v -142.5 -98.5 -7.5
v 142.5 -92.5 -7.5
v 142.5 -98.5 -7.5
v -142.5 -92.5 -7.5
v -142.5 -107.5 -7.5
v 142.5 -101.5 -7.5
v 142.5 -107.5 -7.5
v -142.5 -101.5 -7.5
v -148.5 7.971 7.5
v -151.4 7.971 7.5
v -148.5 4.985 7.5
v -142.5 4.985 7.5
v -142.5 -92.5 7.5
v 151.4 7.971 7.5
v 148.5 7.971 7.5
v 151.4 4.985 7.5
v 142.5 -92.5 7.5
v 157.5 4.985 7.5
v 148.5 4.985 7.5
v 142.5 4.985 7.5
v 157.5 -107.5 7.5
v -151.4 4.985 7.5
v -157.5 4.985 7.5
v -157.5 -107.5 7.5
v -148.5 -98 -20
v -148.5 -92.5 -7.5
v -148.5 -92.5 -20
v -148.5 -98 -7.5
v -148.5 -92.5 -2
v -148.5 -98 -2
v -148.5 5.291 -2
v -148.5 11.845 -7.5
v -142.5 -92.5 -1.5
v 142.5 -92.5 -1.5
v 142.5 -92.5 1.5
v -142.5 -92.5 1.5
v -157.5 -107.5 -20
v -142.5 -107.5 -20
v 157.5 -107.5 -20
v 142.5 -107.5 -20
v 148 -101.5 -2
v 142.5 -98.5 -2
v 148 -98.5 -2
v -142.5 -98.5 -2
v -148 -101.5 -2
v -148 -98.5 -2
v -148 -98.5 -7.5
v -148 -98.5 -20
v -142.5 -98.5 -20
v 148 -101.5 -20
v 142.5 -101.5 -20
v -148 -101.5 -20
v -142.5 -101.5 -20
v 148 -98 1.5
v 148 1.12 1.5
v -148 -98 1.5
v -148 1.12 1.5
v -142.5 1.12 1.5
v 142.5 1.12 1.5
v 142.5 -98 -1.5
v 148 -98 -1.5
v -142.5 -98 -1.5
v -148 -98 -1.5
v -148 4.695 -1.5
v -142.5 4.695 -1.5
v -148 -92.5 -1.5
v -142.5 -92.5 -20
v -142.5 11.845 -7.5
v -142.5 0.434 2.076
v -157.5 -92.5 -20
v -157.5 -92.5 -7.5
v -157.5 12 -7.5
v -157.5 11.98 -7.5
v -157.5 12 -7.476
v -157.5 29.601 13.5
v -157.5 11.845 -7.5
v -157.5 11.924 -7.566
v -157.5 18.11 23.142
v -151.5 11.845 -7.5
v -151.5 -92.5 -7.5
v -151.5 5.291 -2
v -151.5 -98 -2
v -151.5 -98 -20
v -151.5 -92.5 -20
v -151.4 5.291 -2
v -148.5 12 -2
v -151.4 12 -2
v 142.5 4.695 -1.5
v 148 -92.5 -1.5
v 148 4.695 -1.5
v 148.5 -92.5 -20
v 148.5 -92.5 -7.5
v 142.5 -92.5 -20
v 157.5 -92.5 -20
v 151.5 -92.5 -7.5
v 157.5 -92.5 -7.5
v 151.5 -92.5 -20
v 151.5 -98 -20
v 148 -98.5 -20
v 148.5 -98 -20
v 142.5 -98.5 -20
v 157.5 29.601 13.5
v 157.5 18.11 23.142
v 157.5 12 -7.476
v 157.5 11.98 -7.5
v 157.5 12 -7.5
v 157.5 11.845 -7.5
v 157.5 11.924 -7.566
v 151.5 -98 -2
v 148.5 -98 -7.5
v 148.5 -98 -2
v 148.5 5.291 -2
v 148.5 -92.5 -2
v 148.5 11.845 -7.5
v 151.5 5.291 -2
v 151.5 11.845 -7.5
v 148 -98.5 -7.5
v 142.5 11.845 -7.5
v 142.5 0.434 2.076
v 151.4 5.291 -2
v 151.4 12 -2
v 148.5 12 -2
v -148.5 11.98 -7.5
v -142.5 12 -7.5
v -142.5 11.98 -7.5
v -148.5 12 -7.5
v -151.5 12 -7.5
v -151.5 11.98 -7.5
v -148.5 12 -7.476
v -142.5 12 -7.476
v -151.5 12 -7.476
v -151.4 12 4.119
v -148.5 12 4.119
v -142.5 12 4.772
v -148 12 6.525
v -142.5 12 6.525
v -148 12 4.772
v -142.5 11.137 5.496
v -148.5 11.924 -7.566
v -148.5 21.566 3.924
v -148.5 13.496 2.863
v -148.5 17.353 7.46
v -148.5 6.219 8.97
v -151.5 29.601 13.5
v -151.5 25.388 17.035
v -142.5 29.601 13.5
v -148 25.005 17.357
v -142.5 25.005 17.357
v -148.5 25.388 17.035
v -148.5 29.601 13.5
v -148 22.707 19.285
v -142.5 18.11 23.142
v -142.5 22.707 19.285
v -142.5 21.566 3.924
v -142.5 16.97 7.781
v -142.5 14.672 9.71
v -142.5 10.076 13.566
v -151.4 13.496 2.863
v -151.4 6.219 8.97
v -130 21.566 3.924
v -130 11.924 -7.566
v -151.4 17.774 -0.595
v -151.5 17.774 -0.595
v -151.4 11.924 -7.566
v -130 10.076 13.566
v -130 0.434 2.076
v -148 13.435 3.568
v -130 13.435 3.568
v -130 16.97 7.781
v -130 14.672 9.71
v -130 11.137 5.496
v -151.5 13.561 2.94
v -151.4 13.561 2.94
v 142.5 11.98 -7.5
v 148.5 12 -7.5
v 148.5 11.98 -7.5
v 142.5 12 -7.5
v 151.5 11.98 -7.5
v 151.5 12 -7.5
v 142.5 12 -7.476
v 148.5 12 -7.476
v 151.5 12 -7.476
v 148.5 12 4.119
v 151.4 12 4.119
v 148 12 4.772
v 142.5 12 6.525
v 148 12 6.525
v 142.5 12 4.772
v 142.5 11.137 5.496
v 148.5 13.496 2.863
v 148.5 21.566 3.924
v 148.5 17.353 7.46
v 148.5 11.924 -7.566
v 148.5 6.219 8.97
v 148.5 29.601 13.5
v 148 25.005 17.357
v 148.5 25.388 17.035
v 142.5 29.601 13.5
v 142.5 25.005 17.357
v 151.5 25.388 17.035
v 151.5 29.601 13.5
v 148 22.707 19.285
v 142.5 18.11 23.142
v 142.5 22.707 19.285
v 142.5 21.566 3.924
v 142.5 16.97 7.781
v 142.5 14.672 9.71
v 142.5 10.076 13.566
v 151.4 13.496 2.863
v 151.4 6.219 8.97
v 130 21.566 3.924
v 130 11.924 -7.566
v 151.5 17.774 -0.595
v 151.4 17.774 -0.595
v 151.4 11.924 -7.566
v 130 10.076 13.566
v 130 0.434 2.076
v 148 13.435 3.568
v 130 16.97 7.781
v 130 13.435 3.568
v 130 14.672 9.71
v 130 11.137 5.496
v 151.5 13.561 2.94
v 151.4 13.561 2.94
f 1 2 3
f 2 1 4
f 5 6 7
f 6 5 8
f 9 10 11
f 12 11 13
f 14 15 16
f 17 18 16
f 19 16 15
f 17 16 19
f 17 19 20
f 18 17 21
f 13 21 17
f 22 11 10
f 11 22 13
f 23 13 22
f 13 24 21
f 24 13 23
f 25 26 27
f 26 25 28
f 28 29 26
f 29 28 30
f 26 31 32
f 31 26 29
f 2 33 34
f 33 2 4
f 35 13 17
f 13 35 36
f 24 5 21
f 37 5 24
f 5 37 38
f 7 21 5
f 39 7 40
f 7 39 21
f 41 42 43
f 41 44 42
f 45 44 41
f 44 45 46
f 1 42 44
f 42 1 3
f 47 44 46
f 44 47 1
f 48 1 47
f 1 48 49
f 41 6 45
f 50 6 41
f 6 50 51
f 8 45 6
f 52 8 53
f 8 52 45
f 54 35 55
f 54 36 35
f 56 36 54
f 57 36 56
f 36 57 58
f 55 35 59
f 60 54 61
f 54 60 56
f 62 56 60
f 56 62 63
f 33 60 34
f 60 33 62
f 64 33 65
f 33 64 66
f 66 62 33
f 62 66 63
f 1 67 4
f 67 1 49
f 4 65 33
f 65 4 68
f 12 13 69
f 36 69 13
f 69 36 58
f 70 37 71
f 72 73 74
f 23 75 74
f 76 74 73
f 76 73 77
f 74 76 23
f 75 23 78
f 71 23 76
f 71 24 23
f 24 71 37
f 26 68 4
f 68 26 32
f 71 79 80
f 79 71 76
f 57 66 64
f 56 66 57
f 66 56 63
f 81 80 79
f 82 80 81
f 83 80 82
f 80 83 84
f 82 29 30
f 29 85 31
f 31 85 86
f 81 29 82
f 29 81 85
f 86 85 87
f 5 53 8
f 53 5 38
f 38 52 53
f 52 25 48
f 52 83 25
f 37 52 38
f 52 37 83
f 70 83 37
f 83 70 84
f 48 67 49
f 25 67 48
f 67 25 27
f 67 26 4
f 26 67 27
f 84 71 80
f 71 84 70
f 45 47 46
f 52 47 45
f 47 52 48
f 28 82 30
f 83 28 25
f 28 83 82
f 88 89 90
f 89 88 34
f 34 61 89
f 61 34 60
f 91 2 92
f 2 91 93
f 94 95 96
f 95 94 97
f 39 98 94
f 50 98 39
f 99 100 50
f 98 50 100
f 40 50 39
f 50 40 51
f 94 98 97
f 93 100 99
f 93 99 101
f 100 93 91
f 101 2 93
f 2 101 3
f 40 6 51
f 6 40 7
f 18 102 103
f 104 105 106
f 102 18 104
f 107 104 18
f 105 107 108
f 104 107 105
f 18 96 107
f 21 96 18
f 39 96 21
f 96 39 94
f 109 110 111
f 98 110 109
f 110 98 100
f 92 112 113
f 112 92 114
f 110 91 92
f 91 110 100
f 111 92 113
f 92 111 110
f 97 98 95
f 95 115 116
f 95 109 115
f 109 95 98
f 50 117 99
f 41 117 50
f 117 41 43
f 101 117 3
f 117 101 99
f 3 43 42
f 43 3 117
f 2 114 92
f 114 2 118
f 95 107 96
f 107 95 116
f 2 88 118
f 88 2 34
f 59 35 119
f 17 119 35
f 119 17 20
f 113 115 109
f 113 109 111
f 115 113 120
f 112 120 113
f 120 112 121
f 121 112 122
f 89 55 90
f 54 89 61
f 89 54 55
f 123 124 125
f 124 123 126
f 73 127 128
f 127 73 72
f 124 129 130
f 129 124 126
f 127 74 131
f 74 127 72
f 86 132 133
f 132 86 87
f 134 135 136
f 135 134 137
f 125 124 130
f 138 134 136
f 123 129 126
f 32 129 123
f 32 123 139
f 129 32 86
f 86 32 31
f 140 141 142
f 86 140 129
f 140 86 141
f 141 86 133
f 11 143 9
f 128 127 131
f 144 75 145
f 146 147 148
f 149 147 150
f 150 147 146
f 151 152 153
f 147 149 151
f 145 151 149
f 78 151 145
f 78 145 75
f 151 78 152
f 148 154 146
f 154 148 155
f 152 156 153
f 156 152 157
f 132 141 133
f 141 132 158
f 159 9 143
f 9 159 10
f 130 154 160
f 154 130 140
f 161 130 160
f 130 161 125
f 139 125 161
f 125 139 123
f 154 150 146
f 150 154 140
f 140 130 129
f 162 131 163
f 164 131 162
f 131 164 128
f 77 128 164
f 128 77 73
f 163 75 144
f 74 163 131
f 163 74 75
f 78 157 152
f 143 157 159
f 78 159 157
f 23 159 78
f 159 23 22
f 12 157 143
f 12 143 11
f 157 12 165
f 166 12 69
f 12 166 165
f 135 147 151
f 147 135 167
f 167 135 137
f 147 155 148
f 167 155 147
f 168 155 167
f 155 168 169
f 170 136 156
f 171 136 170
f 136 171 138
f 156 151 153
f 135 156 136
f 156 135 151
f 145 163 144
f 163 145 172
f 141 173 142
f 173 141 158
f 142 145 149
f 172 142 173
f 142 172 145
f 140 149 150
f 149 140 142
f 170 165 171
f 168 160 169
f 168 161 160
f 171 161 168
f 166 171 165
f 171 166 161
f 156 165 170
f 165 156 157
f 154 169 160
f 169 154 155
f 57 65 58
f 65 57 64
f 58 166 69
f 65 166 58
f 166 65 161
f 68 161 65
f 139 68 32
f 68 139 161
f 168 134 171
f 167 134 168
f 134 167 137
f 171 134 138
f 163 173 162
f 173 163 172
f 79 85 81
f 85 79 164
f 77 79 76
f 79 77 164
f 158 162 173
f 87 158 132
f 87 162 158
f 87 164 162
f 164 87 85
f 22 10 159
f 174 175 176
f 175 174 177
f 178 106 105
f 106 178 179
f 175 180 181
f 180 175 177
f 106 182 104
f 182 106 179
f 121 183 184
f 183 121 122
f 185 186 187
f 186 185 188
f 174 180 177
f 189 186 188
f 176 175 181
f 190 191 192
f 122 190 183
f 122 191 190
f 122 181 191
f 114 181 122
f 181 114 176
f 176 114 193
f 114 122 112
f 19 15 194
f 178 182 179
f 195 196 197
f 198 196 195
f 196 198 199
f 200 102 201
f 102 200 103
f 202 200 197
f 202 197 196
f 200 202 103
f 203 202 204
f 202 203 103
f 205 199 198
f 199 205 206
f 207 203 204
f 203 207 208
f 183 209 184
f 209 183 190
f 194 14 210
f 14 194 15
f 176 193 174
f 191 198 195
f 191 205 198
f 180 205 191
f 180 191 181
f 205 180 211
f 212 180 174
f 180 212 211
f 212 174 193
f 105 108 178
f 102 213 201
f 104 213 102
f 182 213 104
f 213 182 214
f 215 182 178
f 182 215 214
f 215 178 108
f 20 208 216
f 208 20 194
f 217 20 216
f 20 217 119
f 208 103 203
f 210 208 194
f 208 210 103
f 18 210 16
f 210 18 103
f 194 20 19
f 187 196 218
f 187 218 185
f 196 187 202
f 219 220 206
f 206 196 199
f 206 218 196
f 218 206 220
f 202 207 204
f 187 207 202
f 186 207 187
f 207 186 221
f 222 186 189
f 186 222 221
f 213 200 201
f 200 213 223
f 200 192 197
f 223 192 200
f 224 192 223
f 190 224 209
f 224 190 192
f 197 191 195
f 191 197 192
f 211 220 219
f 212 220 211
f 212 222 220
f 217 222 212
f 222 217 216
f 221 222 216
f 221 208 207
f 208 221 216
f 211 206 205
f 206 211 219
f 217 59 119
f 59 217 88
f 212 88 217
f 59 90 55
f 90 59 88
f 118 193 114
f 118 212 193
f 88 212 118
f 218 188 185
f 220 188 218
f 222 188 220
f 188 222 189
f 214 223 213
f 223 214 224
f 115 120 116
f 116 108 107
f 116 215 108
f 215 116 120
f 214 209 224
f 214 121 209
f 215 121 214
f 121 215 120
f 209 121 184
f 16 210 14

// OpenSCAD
$fn = 20;
mirror(v = [0, 0, 1])
{
  union()
  {
    translate(v = [-150, -100, 0])
    {
      union()
      {
        translate(v = [75.75, 0, 0])
        {
          difference()
          {
            difference()
            {
              cube(size = [148.5, 15, 15], center = true);
              translate(v = [0, 0, 5.5])
              {
                cube(size = [149.5, 3, 7], center = true);
              }
            }
            rotate(a = [-90, 0, 0], v = undef)
            {
              translate(v = [0, 0, 5.5])
              {
                cube(size = [149.5, 3, 7], center = true);
              }
            }
          }
        }
        translate(v = [0, 50.75, 0])
        {
          rotate(a = [90, 0, 90], v = undef)
          {
            difference()
            {
              difference()
              {
                cube(size = [98.5, 15, 15], center = true);
                translate(v = [0, 0, 5.5])
                {
                  cube(size = [99.5, 3, 7], center = true);
                }
              }
              rotate(a = [-90, 0, 0], v = undef)
              {
                translate(v = [0, 0, 5.5])
                {
                  cube(size = [99.5, 3, 7], center = true);
                }
              }
            }
          }
        }
        translate(v = [-2.95, -2.95, 0])
        {
          cube(size = [9.1, 9.1, 15], center = true);
        }
        translate(v = [0, 0, 10.75])
        {
          rotate(a = [0, 90, 0], v = undef)
          {
            difference()
            {
              difference()
              {
                cube(size = [18.5, 15, 15], center = true);
                translate(v = [0, 0, 5.5])
                {
                  cube(size = [19.5, 3, 7], center = true);
                }
              }
              rotate(a = [-90, 0, 0], v = undef)
              {
                translate(v = [0, 0, 5.5])
                {
                  cube(size = [19.5, 3, 7], center = true);
                }
              }
            }
          }
        }
      }
    }
    translate(v = [150, -100, 0])
    {
      rotate(a = [0, 0, 90], v = undef)
      {
        union()
        {
          translate(v = [50.75, 0, 0])
          {
            difference()
            {
              difference()
              {
                cube(size = [98.5, 15, 15], center = true);
                translate(v = [0, 0, 5.5])
                {
                  cube(size = [99.5, 3, 7], center = true);
                }
              }
              rotate(a = [-90, 0, 0], v = undef)
              {
                translate(v = [0, 0, 5.5])
                {
                  cube(size = [99.5, 3, 7], center = true);
                }
              }
            }
          }
          translate(v = [0, 75.75, 0])
          {
            rotate(a = [90, 0, 90], v = undef)
            {
              difference()
              {
                difference()
                {
                  cube(size = [148.5, 15, 15], center = true);
                  translate(v = [0, 0, 5.5])
                  {
                    cube(size = [149.5, 3, 7], center = true);
                  }
                }
                rotate(a = [-90, 0, 0], v = undef)
                {
                  translate(v = [0, 0, 5.5])
                  {
                    cube(size = [149.5, 3, 7], center = true);
                  }
                }
              }
            }
          }
          translate(v = [-2.95, -2.95, 0])
          {
            cube(size = [9.1, 9.1, 15], center = true);
          }
          translate(v = [0, 0, 10.75])
          {
            rotate(a = [0, 90, 0], v = undef)
            {
              difference()
              {
                difference()
                {
                  cube(size = [18.5, 15, 15], center = true);
                  translate(v = [0, 0, 5.5])
                  {
                    cube(size = [19.5, 3, 7], center = true);
                  }
                }
                rotate(a = [-90, 0, 0], v = undef)
                {
                  translate(v = [0, 0, 5.5])
                  {
                    cube(size = [19.5, 3, 7], center = true);
                  }
                }
              }
            }
          }
        }
      }
    }
    translate(v = [-150, 6, 0])
    {
      rotate(a = [0, 0, -90], v = undef)
      {
        union()
        {
          difference()
          {
            difference()
            {
              cube(size = [12, 15, 15], center = true);
              translate(v = [0, 0, 5.5])
              {
                cube(size = [13, 3, 7], center = true);
              }
            }
            rotate(a = [-90, 0, 0], v = undef)
            {
              translate(v = [0, 0, 5.5])
              {
                cube(size = [13, 3, 7], center = true);
              }
            }
          }
          translate(v = [-5, 0, -3])
          {
            rotate(a = [0, 130, 0], v = undef)
            {
              union()
              {
                rotate(a = [-90, 0, 0], v = undef)
                {
                  translate(v = [10.75, 0, 0])
                  {
                    difference()
                    {
                      difference()
                      {
                        cube(size = [18.5, 15, 15], center = true);
                        translate(v = [0, 0, 5.5])
                        {
                          cube(size = [19.5, 3, 7], center = true);
                        }
                      }
                      rotate(a = [-90, 0, 0], v = undef)
                      {
                        translate(v = [-5, 0, 5.5])
                        {
                          cube(size = [28.5, 3, 7], center = true);
                        }
                      }
                    }
                  }
                }
                rotate(a = [0, 90, 0], v = undef)
                {
                  translate(v = [0, 10.75, 0])
                  {
                    rotate(a = [0, 0, 90], v = undef)
                    {
                      difference()
                      {
                        cube(size = [18.5, 15, 15], center = true);
                        translate(v = [0, 0, 5.5])
                        {
                          cube(size = [19.5, 3, 7], center = true);
                        }
                      }
                    }
                  }
                }
                translate(v = [-2.95, -4.45, 0])
                {
                  cube(size = [9.1, 6.1, 15], center = true);
                }
              }
            }
          }
        }
      }
    }
    translate(v = [150, 6, 0])
    {
      mirror(v = [1, 0, 0])
      {
        rotate(a = [0, 0, -90], v = undef)
        {
          union()
          {
            difference()
            {
              difference()
              {
                cube(size = [12, 15, 15], center = true);
                translate(v = [0, 0, 5.5])
                {
                  cube(size = [13, 3, 7], center = true);
                }
              }
              rotate(a = [-90, 0, 0], v = undef)
              {
                translate(v = [0, 0, 5.5])
                {
                  cube(size = [13, 3, 7], center = true);
                }
              }
            }
            translate(v = [-5, 0, -3])
            {
              rotate(a = [0, 130, 0], v = undef)
              {
                union()
                {
                  rotate(a = [-90, 0, 0], v = undef)
                  {
                    translate(v = [10.75, 0, 0])
                    {
                      difference()
                      {
                        difference()
                        {
                          cube(size = [18.5, 15, 15], center = true);
                          translate(v = [0, 0, 5.5])
                          {
                            cube(size = [19.5, 3, 7], center = true);
                          }
                        }
                        rotate(a = [-90, 0, 0], v = undef)
                        {
                          translate(v = [-5, 0, 5.5])
                          {
                            cube(size = [28.5, 3, 7], center = true);
                          }
                        }
                      }
                    }
                  }
                  rotate(a = [0, 90, 0], v = undef)
                  {
                    translate(v = [0, 10.75, 0])
                    {
                      rotate(a = [0, 0, 90], v = undef)
                      {
                        difference()
                        {
                          cube(size = [18.5, 15, 15], center = true);
                          translate(v = [0, 0, 5.5])
                          {
                            cube(size = [19.5, 3, 7], center = true);
                          }
                        }
                      }
                    }
                  }
                  translate(v = [-2.95, -4.45, 0])
                  {
                    cube(size = [9.1, 6.1, 15], center = true);
                  }
                }
              }
            }
          }
        }
      }
    }
  }
}
